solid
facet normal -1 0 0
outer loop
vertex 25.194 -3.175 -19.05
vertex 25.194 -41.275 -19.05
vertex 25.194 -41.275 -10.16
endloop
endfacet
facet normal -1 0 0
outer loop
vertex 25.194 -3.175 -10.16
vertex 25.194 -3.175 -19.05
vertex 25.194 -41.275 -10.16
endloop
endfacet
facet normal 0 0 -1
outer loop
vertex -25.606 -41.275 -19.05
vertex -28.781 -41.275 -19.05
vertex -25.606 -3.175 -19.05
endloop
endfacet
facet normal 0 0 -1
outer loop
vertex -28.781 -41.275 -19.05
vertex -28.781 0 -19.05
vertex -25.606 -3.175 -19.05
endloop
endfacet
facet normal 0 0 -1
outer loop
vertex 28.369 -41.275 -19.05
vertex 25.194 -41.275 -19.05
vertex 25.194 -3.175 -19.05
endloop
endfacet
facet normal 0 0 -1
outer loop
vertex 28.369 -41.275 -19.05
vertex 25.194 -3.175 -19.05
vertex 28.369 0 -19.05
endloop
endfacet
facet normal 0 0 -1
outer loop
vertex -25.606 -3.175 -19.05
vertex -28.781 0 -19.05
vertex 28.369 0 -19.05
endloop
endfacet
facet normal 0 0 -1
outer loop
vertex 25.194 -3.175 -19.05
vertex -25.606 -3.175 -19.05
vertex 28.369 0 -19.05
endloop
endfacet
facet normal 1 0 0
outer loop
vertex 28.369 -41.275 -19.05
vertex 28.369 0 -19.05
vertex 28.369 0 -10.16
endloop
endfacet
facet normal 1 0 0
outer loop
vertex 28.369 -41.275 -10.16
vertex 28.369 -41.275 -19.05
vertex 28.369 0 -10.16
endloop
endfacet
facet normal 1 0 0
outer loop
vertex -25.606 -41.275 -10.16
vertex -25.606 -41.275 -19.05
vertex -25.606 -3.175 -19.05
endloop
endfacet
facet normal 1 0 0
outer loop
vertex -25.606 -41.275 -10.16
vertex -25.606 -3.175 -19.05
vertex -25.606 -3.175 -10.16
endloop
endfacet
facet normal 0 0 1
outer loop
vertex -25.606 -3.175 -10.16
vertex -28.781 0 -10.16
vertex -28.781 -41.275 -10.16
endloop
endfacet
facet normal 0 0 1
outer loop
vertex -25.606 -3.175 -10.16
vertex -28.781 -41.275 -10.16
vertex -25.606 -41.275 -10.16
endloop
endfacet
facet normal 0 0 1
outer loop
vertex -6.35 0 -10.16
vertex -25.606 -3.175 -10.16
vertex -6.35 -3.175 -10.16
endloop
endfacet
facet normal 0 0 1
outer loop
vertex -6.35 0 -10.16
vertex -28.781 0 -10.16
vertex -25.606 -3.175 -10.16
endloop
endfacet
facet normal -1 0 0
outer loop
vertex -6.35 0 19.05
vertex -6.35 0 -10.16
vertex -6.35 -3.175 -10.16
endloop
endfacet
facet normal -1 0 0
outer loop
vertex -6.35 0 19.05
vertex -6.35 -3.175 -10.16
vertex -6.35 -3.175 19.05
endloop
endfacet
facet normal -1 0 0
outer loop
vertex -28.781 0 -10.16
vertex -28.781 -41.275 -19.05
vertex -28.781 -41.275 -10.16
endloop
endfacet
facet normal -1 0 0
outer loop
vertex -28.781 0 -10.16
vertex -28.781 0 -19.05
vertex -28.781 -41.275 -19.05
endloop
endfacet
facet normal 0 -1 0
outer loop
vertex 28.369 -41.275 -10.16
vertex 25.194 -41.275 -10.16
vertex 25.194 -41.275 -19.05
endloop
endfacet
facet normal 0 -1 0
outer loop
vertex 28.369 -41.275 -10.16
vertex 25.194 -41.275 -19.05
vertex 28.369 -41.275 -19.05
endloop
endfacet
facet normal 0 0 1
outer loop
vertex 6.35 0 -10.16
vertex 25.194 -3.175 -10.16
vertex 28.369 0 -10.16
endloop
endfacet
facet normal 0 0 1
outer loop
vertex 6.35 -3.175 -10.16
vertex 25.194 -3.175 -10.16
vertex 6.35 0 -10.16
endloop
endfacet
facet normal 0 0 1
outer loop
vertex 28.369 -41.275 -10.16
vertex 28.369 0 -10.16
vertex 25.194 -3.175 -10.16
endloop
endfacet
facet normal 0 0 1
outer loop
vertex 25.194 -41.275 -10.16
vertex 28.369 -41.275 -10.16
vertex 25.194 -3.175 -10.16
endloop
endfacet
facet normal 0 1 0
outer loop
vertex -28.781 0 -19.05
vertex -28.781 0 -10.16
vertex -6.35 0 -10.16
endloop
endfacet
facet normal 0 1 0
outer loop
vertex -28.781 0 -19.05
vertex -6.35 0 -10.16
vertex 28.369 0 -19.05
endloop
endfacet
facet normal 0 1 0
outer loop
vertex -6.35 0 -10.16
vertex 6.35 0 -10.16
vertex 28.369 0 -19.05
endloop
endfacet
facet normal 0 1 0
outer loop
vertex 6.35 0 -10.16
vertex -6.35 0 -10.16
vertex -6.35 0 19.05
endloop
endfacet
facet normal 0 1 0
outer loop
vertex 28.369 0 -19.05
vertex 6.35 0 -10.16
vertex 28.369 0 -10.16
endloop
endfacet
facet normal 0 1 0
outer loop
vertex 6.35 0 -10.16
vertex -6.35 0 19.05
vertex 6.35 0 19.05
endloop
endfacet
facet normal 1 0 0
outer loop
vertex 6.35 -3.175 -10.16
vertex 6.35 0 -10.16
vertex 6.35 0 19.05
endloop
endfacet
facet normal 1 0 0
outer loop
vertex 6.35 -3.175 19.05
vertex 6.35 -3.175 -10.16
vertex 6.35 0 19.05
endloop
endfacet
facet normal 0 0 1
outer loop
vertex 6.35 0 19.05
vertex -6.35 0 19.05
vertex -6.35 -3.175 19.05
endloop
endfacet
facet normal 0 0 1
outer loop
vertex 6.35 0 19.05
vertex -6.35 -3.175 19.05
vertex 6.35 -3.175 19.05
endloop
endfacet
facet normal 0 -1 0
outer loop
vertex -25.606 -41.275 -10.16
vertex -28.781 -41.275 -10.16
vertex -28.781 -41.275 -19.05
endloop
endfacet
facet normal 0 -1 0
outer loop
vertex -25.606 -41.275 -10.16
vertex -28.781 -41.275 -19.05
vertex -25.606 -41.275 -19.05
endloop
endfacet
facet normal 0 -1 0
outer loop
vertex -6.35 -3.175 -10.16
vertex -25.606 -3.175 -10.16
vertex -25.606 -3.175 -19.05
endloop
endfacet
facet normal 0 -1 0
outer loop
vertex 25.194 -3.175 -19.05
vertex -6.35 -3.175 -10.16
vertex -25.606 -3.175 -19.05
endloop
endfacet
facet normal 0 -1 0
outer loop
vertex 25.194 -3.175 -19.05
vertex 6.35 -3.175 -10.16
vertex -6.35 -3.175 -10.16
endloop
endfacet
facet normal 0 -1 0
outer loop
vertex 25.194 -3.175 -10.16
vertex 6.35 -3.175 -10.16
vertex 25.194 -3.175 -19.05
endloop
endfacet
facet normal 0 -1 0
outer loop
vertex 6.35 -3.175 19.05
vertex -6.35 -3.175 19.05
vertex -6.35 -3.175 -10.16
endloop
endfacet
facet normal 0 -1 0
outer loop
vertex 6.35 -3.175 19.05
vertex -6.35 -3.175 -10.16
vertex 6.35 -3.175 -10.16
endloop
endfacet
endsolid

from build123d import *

# Parameters (mm, degrees)
F0_W     = 12.7
F0_H     = 38.1
F1_DEPTH = 3.175
F3_DEPTH = 3.175
F4_W     = 3.175
F4_H     = 8.89
F5_DEPTH = 38.1


with BuildPart() as f1:
    # F0 (on Front) → F1 (new body)
    with BuildSketch(Plane.XZ):
        Rectangle(F0_W, F0_H)
    extrude(amount=F1_DEPTH)

    # F2 (on face) → F3 (join)
    with BuildSketch(Plane.XZ.offset(3.175)):
        Polygon((-4.688735, -19.05), (6.35, -19.05), (28.369022, -19.05), (28.369022, -10.16), (3.864823, -10.16), (-6.35, -10.16), (-28.780978, -10.16), (-28.780978, -19.05), align=None)
    extrude(amount=-F3_DEPTH)

    # F4 (on face) → F5 (join)
    with BuildSketch(Plane.XZ.offset(3.175)):
        with Locations((-27.193478, -14.605)):
            Rectangle(F4_W, F4_H)
        with Locations((26.781522, -14.605)):
            Rectangle(F4_W, F4_H)
    extrude(amount=F5_DEPTH)


solid = f1.part
